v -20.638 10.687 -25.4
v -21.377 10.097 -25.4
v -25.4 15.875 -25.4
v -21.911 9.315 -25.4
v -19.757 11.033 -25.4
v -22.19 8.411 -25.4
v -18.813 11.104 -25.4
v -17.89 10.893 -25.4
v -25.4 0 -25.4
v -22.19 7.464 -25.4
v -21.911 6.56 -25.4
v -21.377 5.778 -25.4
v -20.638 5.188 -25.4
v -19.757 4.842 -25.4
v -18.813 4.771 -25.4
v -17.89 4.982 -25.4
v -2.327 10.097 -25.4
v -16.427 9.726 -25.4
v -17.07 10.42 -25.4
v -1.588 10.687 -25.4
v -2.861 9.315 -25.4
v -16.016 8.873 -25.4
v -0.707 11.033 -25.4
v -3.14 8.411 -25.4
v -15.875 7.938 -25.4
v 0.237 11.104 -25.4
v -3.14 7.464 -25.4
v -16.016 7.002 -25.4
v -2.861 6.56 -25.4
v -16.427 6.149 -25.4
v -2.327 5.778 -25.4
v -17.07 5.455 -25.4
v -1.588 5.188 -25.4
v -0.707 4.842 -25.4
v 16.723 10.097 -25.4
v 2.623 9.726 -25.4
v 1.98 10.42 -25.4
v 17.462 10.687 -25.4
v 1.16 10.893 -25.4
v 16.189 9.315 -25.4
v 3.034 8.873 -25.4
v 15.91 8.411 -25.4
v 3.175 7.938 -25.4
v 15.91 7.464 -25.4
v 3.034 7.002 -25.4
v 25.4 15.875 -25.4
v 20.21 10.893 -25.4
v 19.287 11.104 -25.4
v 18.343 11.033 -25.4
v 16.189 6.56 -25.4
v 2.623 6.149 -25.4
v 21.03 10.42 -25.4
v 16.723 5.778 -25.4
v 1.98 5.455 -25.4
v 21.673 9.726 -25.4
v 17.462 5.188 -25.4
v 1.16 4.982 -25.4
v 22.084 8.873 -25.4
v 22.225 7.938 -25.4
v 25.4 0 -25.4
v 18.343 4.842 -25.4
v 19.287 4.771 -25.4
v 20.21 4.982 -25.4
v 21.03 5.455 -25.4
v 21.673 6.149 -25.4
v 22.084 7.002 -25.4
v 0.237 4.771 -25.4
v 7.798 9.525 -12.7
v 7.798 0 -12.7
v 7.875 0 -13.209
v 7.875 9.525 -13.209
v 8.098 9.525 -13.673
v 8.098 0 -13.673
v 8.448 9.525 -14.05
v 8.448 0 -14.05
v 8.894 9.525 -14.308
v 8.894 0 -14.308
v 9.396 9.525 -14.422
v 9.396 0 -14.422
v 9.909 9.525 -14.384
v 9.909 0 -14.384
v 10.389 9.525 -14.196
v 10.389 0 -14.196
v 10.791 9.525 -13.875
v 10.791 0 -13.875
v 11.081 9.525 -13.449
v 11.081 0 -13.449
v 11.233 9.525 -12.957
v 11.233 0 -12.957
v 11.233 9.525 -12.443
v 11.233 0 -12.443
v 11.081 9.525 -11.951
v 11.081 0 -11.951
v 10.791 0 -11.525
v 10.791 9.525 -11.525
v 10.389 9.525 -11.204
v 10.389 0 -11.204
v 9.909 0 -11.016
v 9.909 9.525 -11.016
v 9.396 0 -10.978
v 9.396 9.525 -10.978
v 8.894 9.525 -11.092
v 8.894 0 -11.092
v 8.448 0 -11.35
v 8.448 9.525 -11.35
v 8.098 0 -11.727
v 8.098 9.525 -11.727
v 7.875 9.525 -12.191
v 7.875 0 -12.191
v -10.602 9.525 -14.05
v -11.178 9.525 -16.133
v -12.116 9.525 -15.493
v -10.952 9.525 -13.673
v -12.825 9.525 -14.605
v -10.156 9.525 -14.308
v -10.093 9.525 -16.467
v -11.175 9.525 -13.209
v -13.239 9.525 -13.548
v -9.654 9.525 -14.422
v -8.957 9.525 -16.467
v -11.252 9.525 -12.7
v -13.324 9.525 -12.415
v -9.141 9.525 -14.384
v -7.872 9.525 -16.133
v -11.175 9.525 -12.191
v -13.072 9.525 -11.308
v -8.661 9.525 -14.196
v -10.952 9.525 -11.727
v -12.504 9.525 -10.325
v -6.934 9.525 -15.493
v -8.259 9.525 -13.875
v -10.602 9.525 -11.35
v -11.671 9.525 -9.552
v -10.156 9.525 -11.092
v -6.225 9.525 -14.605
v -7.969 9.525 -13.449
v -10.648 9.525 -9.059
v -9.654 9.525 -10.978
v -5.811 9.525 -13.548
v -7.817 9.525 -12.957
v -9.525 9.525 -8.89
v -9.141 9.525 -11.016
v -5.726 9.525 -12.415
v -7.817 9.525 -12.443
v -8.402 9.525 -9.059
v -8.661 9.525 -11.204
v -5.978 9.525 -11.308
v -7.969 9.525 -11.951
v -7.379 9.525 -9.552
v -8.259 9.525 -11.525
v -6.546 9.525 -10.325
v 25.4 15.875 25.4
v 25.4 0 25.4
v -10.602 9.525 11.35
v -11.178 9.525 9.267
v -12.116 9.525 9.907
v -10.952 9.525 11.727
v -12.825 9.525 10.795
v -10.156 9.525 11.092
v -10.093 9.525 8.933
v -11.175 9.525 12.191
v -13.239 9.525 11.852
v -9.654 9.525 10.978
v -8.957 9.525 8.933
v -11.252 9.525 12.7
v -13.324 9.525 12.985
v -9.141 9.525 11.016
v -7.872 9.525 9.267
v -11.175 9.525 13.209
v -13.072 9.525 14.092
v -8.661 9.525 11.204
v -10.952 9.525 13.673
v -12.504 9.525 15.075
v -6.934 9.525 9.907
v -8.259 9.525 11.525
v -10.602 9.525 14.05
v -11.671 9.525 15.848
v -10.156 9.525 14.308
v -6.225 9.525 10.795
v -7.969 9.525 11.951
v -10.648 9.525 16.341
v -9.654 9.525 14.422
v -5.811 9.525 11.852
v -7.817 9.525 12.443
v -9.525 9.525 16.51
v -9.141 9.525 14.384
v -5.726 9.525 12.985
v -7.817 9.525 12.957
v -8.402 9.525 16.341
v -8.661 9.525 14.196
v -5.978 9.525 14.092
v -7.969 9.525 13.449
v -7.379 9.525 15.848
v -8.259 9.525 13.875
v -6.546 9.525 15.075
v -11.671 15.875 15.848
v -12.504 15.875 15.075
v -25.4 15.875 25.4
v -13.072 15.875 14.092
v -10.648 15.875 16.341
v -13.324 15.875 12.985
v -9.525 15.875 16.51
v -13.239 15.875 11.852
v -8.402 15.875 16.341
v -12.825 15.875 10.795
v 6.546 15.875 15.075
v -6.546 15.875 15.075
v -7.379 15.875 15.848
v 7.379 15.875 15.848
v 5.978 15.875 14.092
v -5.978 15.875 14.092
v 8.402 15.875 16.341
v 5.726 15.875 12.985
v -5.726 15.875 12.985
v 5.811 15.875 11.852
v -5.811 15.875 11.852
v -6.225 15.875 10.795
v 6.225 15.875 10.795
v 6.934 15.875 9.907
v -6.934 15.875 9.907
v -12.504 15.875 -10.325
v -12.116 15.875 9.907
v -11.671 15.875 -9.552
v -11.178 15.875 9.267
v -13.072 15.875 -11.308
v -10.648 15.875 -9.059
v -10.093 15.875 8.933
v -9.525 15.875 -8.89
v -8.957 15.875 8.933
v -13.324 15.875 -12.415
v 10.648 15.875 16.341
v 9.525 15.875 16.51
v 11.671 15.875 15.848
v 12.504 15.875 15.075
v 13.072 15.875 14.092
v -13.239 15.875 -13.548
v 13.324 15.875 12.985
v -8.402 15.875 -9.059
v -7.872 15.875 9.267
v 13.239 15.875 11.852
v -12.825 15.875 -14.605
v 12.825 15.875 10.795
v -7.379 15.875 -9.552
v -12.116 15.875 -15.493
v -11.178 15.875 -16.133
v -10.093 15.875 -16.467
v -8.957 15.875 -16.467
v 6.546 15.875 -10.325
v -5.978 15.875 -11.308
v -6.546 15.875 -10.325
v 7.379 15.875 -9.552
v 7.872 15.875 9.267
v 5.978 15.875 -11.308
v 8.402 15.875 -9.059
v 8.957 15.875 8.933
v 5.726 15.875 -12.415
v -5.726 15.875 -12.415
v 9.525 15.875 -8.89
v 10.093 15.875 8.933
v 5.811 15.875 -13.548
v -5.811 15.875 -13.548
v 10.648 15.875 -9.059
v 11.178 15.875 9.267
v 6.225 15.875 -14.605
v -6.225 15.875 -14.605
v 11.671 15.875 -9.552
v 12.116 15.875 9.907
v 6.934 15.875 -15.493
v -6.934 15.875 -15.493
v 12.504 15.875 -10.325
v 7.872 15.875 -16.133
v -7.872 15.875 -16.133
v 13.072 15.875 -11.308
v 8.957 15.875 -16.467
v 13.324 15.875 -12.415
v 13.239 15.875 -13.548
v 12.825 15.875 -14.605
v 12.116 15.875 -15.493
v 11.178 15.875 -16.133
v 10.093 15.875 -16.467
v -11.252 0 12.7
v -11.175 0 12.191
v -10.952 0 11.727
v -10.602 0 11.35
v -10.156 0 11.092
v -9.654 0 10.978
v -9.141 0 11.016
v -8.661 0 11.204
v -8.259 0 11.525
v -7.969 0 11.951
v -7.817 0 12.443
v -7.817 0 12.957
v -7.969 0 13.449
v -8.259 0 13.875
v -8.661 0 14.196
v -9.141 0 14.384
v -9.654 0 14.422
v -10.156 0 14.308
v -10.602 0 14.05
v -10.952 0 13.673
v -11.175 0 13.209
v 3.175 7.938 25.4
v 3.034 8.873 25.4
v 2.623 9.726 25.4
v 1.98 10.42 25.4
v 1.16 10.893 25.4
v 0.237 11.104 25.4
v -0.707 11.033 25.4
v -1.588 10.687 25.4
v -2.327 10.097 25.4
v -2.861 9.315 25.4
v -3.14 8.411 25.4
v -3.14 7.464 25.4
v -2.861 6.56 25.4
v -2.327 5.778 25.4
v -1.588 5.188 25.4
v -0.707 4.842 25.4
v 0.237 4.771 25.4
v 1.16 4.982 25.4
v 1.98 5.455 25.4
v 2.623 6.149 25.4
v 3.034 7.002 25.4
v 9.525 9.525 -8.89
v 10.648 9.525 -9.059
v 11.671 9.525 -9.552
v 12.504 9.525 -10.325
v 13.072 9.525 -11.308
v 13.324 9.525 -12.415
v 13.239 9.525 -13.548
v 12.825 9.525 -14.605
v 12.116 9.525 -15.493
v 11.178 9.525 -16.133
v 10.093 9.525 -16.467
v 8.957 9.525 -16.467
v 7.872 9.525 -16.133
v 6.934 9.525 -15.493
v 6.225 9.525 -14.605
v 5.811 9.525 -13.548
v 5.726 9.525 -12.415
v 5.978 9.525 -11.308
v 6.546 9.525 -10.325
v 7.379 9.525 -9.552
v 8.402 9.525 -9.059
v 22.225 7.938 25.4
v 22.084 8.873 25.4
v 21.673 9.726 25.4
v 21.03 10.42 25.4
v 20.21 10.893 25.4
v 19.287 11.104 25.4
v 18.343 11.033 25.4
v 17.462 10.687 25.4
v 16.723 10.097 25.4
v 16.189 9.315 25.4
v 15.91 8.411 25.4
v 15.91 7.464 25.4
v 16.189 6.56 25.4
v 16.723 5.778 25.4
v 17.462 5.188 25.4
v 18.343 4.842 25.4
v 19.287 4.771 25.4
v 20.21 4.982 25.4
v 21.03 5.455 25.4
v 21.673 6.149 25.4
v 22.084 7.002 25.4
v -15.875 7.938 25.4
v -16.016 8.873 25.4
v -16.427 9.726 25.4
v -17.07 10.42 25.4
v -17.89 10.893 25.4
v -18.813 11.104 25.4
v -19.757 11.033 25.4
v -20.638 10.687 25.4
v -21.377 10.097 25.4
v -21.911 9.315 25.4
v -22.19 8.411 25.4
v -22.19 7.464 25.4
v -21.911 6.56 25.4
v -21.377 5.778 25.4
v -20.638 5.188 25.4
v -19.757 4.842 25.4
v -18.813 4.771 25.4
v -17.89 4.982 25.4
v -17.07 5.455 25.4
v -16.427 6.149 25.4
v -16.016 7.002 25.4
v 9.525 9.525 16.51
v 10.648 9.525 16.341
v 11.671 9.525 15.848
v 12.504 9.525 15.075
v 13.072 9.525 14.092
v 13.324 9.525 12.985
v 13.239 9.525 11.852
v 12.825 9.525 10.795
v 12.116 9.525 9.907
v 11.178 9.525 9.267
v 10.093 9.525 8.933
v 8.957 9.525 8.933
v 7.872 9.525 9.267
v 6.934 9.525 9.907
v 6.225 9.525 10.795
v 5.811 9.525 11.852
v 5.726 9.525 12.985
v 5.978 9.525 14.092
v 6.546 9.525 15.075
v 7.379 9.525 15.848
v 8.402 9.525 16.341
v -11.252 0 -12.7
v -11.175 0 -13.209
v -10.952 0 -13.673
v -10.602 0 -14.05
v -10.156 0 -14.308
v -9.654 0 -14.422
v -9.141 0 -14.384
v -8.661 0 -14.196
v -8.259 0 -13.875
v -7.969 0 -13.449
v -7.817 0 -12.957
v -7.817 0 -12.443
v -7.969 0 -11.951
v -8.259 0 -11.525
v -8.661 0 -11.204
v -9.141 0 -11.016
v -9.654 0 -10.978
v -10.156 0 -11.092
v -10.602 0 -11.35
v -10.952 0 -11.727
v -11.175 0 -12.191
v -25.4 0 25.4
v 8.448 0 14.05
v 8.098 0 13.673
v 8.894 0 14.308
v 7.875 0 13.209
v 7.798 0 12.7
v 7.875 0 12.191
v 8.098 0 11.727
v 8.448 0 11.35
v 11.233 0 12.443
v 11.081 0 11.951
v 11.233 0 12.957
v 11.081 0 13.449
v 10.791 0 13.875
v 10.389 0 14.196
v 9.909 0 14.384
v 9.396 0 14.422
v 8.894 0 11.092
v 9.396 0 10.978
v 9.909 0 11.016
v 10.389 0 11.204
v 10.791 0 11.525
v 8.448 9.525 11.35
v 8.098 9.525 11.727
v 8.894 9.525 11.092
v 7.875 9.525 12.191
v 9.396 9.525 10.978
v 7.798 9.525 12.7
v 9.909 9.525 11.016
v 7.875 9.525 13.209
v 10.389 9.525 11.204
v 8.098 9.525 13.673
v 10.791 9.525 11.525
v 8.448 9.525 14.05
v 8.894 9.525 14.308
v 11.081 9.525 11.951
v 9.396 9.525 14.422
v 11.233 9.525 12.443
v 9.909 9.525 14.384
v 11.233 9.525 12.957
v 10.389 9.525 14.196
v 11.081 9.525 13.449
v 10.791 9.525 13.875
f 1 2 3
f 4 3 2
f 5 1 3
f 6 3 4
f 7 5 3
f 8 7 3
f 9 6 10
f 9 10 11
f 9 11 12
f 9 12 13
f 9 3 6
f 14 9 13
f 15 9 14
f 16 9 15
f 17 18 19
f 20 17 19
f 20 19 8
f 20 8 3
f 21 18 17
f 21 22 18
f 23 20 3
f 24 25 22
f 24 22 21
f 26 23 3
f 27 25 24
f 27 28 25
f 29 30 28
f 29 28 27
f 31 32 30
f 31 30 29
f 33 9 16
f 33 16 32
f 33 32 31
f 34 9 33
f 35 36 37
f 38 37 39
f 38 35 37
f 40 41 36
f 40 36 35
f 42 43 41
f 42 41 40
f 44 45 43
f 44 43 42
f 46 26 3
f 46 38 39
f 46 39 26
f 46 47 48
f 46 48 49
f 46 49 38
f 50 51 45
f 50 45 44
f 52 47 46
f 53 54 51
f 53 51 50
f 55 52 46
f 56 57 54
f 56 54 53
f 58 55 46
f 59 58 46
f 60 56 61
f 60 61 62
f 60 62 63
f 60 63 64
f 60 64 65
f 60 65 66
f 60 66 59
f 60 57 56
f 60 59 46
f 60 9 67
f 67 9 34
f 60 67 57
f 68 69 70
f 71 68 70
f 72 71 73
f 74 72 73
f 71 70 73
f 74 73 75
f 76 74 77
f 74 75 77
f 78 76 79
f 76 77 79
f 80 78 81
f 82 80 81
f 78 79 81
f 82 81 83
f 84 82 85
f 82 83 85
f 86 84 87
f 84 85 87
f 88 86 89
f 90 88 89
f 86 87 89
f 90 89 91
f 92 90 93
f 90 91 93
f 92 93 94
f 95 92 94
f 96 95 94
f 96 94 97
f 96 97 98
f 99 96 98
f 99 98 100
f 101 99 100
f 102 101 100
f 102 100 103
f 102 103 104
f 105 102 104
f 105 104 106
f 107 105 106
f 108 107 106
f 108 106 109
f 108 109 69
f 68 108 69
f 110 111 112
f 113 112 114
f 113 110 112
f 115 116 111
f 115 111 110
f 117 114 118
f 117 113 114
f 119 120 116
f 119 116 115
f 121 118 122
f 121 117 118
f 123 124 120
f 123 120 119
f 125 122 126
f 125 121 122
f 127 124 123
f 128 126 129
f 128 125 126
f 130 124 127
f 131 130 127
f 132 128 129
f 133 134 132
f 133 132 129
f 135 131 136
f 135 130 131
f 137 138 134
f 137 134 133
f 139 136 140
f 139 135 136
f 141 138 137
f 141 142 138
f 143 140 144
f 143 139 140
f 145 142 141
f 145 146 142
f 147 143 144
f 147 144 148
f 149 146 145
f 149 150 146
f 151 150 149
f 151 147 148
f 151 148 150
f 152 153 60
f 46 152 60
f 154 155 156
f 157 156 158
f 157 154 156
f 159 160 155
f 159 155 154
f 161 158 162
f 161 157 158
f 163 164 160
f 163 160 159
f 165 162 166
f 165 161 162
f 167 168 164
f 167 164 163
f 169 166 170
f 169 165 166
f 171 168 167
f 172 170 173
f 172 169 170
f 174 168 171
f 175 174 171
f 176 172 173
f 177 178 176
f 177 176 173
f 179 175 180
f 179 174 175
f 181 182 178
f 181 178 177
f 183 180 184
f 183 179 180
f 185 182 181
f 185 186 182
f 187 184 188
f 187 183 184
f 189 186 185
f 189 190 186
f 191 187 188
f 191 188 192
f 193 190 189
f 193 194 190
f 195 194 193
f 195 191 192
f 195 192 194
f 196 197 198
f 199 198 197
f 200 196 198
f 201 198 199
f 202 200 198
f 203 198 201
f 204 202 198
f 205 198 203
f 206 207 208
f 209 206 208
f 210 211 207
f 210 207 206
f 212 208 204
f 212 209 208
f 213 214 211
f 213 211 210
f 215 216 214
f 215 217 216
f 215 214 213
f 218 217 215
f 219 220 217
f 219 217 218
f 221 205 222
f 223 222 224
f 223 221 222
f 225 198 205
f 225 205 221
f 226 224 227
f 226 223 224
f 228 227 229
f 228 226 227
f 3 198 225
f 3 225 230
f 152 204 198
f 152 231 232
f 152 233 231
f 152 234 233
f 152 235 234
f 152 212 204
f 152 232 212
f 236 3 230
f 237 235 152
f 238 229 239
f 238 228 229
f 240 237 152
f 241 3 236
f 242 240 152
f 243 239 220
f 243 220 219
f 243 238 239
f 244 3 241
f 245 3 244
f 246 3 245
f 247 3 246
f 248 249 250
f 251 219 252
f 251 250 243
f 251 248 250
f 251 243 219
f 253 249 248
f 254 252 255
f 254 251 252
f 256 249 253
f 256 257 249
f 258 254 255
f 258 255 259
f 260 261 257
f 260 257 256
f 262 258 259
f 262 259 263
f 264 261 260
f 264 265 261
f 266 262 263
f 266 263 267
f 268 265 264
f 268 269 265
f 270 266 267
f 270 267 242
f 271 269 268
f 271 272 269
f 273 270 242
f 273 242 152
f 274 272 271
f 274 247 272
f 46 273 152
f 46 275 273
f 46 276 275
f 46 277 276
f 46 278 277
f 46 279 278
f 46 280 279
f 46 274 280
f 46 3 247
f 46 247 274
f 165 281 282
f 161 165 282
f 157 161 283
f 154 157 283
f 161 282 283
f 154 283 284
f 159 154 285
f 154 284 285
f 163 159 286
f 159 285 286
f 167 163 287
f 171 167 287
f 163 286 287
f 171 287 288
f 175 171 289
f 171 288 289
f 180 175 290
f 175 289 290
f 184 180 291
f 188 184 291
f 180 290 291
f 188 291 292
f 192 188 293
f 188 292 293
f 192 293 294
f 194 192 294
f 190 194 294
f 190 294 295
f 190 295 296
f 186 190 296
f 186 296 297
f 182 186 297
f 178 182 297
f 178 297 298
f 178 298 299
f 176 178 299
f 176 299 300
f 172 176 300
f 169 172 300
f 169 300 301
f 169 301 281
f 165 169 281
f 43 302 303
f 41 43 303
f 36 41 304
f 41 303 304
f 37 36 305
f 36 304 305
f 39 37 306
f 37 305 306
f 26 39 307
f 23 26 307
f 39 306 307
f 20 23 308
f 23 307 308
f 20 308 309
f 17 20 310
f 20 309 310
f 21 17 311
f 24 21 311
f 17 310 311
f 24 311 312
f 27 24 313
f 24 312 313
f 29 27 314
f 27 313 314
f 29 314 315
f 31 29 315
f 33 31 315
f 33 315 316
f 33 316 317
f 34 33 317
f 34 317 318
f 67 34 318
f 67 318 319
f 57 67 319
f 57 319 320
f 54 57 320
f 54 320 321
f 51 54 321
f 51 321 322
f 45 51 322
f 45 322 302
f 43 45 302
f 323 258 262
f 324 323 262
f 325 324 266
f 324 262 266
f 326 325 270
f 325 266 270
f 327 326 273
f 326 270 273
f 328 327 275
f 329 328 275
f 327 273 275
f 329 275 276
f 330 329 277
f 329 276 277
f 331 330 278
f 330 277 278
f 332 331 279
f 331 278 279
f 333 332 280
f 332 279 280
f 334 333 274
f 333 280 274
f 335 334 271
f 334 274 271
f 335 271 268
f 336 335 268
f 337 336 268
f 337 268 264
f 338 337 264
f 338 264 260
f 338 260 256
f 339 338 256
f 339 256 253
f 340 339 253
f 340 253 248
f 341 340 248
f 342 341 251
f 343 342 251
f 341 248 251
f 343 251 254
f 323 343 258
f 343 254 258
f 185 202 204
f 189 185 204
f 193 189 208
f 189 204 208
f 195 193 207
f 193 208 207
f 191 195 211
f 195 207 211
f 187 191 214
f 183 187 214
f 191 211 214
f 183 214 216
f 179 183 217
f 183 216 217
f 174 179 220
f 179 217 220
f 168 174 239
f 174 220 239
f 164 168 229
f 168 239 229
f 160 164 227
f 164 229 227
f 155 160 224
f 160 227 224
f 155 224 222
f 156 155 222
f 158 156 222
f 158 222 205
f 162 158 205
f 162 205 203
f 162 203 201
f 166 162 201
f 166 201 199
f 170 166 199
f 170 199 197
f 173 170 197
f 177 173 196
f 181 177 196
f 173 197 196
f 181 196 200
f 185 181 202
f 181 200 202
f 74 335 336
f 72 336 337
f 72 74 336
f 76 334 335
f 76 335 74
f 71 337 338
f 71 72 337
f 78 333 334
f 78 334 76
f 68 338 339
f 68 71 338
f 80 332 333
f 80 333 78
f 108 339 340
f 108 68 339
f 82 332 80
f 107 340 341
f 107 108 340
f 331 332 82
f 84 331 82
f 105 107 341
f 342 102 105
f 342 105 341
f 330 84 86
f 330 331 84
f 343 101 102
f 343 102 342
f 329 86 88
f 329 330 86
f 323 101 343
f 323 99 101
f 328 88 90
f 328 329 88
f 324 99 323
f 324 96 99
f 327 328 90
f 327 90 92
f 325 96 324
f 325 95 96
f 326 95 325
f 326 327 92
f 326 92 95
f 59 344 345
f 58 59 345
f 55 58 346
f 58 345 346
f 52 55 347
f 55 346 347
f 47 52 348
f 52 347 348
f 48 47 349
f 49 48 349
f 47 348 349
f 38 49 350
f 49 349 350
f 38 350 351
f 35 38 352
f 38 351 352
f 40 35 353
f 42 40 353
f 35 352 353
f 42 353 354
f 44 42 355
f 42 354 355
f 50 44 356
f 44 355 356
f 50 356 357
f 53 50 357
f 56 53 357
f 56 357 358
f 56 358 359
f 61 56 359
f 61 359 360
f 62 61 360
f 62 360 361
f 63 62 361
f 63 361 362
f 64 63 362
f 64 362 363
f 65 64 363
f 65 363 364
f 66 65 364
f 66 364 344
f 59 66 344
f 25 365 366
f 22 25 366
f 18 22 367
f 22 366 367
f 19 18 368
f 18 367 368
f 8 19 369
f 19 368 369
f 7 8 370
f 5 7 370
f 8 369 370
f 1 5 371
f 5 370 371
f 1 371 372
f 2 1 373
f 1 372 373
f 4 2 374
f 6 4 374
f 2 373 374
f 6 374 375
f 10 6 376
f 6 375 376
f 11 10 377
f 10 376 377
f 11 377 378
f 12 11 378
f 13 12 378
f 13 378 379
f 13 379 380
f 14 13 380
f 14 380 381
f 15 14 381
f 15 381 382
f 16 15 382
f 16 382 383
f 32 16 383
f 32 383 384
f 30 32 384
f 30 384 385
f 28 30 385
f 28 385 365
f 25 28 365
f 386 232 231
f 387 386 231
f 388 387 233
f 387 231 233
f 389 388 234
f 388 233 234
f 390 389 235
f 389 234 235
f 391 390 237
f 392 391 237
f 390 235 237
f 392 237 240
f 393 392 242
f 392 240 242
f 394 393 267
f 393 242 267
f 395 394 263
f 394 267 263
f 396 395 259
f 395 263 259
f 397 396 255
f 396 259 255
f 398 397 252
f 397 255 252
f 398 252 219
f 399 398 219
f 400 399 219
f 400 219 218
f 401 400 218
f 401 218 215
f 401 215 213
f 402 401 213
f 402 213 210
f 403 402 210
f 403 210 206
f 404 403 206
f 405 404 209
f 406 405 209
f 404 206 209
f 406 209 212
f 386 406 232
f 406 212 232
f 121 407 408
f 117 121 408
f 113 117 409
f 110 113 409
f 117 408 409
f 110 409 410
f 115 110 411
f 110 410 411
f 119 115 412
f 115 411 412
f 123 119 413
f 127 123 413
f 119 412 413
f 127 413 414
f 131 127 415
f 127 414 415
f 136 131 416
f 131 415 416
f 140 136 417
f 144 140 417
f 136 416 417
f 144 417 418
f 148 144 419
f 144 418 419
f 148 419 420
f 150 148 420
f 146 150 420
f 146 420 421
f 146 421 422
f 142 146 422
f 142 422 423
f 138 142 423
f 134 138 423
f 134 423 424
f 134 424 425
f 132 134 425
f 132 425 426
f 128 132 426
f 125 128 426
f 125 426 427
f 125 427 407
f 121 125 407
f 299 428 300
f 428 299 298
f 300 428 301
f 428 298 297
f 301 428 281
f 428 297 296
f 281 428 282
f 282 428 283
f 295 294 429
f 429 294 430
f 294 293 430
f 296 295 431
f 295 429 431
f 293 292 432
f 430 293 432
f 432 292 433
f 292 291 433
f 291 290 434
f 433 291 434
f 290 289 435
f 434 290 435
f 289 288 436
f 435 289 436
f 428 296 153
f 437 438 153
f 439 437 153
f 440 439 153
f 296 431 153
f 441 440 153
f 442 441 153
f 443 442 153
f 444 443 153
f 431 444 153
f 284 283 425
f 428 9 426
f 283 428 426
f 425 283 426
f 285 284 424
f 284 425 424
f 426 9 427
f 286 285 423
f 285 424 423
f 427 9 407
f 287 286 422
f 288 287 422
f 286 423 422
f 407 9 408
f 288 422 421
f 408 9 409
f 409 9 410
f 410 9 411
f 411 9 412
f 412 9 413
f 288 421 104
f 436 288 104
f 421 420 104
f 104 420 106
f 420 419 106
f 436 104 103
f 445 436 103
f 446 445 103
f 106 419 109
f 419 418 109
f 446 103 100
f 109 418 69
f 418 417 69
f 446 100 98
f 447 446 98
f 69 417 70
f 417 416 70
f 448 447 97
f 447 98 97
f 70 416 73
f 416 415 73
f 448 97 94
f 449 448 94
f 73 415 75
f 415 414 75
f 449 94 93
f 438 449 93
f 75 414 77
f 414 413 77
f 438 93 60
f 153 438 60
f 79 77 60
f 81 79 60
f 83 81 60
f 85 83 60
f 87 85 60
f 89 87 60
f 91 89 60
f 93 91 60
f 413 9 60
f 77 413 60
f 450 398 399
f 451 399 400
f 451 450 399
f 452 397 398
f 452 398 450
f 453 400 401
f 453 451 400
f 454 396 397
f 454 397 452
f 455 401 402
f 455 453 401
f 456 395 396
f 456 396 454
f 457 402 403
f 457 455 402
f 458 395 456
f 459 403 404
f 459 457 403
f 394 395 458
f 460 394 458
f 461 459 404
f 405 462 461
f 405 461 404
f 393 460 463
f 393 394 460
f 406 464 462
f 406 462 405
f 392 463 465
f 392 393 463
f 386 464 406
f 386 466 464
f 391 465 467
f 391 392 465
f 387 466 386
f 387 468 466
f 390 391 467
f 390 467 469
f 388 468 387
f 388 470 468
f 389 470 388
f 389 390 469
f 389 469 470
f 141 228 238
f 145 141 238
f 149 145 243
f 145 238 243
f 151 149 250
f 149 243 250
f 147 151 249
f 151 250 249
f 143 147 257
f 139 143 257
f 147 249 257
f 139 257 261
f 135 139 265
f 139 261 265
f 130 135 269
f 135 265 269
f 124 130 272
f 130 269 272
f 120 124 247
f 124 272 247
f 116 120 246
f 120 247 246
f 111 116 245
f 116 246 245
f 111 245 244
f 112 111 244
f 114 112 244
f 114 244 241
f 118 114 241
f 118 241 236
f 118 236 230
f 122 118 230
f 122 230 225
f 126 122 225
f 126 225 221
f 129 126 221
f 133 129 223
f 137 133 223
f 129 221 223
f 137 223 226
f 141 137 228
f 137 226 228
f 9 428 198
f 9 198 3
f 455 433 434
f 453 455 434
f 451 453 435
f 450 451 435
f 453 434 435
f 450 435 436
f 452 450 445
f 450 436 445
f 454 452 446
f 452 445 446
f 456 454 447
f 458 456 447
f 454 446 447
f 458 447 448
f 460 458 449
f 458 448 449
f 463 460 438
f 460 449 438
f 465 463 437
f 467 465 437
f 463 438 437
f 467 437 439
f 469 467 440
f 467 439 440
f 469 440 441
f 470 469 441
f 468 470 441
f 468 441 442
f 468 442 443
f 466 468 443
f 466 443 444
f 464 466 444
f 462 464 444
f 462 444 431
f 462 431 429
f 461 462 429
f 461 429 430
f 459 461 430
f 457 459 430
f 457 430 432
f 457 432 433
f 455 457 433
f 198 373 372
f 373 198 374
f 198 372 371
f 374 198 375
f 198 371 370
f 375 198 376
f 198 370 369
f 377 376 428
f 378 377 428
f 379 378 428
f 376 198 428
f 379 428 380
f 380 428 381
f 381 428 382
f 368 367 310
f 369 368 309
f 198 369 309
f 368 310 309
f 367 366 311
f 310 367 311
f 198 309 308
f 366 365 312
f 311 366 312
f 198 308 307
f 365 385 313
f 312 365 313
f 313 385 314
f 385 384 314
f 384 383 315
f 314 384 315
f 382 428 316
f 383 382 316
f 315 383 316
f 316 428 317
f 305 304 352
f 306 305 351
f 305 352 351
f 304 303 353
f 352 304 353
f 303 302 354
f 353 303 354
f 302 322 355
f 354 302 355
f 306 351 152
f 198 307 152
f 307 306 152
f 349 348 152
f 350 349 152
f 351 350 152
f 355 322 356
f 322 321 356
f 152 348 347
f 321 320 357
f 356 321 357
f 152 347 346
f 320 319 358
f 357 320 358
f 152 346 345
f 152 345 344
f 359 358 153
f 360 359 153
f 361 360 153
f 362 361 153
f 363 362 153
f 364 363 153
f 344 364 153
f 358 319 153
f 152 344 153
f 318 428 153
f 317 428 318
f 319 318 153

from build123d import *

# Parameters (mm, degrees)
SKETCH1_W                 = 50.8
SKETCH1_H                 = 50.8
BOSS_EXTRUDE1_DEPTH       = 15.875
SKETCH2_R                 = 3.175
CUT_EXTRUDE1_DEPTH        = 59.973007597
TAP_DRILL_FOR_8_32_TAP1_D = 3.4544
SKETCH5_R                 = 3.81
CUT_EXTRUDE2_DEPTH        = 6.35


with BuildPart() as part:
    # Sketch1 → Boss-Extrude1 (new body)
    with BuildSketch(Plane(origin=(0, 0, 0), x_dir=(1, 0, 0), z_dir=(0, 1, 0))):
        Rectangle(SKETCH1_W, SKETCH1_H)
    extrude(amount=BOSS_EXTRUDE1_DEPTH)

    # Sketch2 → Cut-Extrude1 (cut, through all)
    with BuildSketch(Plane.XY.offset(25.4)):
        with Locations((-19.05, 7.9375)):
            Circle(SKETCH2_R)
        with Locations((0, 7.9375)):
            Circle(SKETCH2_R)
        with Locations((19.05, 7.9375)):
            Circle(SKETCH2_R)
    extrude(amount=-CUT_EXTRUDE1_DEPTH, mode=Mode.SUBTRACT)

    # Tap Drill for #8-32 Tap1 (through all)
    with Locations(Plane(origin=(0, 15.875, 0), x_dir=(1, 0, 0), z_dir=(0, 1, 0))):
        with Locations((-9.525, -12.7), (-9.525, 12.7), (9.525, 12.7), (9.525, -12.7)):
            Hole(TAP_DRILL_FOR_8_32_TAP1_D / 2)

    # Sketch5 → Cut-Extrude2 (cut)
    with BuildSketch(Plane(origin=(0, 15.875, 0), x_dir=(1, 0, 0), z_dir=(0, 1, 0))):
        with Locations(Location((-9.525, 12.7, 0), (0, 0, 270))):
            Circle(SKETCH5_R)
        with Locations(Location((9.525, 12.7, 0), (0, 0, 270))):
            Circle(SKETCH5_R)
        with Locations(Location((9.525, -12.7, 0), (0, 0, 270))):
            Circle(SKETCH5_R)
        with Locations(Location((-9.525, -12.7, 0), (0, 0, 270))):
            Circle(SKETCH5_R)
    extrude(amount=-CUT_EXTRUDE2_DEPTH, mode=Mode.SUBTRACT)


solid = part.part
